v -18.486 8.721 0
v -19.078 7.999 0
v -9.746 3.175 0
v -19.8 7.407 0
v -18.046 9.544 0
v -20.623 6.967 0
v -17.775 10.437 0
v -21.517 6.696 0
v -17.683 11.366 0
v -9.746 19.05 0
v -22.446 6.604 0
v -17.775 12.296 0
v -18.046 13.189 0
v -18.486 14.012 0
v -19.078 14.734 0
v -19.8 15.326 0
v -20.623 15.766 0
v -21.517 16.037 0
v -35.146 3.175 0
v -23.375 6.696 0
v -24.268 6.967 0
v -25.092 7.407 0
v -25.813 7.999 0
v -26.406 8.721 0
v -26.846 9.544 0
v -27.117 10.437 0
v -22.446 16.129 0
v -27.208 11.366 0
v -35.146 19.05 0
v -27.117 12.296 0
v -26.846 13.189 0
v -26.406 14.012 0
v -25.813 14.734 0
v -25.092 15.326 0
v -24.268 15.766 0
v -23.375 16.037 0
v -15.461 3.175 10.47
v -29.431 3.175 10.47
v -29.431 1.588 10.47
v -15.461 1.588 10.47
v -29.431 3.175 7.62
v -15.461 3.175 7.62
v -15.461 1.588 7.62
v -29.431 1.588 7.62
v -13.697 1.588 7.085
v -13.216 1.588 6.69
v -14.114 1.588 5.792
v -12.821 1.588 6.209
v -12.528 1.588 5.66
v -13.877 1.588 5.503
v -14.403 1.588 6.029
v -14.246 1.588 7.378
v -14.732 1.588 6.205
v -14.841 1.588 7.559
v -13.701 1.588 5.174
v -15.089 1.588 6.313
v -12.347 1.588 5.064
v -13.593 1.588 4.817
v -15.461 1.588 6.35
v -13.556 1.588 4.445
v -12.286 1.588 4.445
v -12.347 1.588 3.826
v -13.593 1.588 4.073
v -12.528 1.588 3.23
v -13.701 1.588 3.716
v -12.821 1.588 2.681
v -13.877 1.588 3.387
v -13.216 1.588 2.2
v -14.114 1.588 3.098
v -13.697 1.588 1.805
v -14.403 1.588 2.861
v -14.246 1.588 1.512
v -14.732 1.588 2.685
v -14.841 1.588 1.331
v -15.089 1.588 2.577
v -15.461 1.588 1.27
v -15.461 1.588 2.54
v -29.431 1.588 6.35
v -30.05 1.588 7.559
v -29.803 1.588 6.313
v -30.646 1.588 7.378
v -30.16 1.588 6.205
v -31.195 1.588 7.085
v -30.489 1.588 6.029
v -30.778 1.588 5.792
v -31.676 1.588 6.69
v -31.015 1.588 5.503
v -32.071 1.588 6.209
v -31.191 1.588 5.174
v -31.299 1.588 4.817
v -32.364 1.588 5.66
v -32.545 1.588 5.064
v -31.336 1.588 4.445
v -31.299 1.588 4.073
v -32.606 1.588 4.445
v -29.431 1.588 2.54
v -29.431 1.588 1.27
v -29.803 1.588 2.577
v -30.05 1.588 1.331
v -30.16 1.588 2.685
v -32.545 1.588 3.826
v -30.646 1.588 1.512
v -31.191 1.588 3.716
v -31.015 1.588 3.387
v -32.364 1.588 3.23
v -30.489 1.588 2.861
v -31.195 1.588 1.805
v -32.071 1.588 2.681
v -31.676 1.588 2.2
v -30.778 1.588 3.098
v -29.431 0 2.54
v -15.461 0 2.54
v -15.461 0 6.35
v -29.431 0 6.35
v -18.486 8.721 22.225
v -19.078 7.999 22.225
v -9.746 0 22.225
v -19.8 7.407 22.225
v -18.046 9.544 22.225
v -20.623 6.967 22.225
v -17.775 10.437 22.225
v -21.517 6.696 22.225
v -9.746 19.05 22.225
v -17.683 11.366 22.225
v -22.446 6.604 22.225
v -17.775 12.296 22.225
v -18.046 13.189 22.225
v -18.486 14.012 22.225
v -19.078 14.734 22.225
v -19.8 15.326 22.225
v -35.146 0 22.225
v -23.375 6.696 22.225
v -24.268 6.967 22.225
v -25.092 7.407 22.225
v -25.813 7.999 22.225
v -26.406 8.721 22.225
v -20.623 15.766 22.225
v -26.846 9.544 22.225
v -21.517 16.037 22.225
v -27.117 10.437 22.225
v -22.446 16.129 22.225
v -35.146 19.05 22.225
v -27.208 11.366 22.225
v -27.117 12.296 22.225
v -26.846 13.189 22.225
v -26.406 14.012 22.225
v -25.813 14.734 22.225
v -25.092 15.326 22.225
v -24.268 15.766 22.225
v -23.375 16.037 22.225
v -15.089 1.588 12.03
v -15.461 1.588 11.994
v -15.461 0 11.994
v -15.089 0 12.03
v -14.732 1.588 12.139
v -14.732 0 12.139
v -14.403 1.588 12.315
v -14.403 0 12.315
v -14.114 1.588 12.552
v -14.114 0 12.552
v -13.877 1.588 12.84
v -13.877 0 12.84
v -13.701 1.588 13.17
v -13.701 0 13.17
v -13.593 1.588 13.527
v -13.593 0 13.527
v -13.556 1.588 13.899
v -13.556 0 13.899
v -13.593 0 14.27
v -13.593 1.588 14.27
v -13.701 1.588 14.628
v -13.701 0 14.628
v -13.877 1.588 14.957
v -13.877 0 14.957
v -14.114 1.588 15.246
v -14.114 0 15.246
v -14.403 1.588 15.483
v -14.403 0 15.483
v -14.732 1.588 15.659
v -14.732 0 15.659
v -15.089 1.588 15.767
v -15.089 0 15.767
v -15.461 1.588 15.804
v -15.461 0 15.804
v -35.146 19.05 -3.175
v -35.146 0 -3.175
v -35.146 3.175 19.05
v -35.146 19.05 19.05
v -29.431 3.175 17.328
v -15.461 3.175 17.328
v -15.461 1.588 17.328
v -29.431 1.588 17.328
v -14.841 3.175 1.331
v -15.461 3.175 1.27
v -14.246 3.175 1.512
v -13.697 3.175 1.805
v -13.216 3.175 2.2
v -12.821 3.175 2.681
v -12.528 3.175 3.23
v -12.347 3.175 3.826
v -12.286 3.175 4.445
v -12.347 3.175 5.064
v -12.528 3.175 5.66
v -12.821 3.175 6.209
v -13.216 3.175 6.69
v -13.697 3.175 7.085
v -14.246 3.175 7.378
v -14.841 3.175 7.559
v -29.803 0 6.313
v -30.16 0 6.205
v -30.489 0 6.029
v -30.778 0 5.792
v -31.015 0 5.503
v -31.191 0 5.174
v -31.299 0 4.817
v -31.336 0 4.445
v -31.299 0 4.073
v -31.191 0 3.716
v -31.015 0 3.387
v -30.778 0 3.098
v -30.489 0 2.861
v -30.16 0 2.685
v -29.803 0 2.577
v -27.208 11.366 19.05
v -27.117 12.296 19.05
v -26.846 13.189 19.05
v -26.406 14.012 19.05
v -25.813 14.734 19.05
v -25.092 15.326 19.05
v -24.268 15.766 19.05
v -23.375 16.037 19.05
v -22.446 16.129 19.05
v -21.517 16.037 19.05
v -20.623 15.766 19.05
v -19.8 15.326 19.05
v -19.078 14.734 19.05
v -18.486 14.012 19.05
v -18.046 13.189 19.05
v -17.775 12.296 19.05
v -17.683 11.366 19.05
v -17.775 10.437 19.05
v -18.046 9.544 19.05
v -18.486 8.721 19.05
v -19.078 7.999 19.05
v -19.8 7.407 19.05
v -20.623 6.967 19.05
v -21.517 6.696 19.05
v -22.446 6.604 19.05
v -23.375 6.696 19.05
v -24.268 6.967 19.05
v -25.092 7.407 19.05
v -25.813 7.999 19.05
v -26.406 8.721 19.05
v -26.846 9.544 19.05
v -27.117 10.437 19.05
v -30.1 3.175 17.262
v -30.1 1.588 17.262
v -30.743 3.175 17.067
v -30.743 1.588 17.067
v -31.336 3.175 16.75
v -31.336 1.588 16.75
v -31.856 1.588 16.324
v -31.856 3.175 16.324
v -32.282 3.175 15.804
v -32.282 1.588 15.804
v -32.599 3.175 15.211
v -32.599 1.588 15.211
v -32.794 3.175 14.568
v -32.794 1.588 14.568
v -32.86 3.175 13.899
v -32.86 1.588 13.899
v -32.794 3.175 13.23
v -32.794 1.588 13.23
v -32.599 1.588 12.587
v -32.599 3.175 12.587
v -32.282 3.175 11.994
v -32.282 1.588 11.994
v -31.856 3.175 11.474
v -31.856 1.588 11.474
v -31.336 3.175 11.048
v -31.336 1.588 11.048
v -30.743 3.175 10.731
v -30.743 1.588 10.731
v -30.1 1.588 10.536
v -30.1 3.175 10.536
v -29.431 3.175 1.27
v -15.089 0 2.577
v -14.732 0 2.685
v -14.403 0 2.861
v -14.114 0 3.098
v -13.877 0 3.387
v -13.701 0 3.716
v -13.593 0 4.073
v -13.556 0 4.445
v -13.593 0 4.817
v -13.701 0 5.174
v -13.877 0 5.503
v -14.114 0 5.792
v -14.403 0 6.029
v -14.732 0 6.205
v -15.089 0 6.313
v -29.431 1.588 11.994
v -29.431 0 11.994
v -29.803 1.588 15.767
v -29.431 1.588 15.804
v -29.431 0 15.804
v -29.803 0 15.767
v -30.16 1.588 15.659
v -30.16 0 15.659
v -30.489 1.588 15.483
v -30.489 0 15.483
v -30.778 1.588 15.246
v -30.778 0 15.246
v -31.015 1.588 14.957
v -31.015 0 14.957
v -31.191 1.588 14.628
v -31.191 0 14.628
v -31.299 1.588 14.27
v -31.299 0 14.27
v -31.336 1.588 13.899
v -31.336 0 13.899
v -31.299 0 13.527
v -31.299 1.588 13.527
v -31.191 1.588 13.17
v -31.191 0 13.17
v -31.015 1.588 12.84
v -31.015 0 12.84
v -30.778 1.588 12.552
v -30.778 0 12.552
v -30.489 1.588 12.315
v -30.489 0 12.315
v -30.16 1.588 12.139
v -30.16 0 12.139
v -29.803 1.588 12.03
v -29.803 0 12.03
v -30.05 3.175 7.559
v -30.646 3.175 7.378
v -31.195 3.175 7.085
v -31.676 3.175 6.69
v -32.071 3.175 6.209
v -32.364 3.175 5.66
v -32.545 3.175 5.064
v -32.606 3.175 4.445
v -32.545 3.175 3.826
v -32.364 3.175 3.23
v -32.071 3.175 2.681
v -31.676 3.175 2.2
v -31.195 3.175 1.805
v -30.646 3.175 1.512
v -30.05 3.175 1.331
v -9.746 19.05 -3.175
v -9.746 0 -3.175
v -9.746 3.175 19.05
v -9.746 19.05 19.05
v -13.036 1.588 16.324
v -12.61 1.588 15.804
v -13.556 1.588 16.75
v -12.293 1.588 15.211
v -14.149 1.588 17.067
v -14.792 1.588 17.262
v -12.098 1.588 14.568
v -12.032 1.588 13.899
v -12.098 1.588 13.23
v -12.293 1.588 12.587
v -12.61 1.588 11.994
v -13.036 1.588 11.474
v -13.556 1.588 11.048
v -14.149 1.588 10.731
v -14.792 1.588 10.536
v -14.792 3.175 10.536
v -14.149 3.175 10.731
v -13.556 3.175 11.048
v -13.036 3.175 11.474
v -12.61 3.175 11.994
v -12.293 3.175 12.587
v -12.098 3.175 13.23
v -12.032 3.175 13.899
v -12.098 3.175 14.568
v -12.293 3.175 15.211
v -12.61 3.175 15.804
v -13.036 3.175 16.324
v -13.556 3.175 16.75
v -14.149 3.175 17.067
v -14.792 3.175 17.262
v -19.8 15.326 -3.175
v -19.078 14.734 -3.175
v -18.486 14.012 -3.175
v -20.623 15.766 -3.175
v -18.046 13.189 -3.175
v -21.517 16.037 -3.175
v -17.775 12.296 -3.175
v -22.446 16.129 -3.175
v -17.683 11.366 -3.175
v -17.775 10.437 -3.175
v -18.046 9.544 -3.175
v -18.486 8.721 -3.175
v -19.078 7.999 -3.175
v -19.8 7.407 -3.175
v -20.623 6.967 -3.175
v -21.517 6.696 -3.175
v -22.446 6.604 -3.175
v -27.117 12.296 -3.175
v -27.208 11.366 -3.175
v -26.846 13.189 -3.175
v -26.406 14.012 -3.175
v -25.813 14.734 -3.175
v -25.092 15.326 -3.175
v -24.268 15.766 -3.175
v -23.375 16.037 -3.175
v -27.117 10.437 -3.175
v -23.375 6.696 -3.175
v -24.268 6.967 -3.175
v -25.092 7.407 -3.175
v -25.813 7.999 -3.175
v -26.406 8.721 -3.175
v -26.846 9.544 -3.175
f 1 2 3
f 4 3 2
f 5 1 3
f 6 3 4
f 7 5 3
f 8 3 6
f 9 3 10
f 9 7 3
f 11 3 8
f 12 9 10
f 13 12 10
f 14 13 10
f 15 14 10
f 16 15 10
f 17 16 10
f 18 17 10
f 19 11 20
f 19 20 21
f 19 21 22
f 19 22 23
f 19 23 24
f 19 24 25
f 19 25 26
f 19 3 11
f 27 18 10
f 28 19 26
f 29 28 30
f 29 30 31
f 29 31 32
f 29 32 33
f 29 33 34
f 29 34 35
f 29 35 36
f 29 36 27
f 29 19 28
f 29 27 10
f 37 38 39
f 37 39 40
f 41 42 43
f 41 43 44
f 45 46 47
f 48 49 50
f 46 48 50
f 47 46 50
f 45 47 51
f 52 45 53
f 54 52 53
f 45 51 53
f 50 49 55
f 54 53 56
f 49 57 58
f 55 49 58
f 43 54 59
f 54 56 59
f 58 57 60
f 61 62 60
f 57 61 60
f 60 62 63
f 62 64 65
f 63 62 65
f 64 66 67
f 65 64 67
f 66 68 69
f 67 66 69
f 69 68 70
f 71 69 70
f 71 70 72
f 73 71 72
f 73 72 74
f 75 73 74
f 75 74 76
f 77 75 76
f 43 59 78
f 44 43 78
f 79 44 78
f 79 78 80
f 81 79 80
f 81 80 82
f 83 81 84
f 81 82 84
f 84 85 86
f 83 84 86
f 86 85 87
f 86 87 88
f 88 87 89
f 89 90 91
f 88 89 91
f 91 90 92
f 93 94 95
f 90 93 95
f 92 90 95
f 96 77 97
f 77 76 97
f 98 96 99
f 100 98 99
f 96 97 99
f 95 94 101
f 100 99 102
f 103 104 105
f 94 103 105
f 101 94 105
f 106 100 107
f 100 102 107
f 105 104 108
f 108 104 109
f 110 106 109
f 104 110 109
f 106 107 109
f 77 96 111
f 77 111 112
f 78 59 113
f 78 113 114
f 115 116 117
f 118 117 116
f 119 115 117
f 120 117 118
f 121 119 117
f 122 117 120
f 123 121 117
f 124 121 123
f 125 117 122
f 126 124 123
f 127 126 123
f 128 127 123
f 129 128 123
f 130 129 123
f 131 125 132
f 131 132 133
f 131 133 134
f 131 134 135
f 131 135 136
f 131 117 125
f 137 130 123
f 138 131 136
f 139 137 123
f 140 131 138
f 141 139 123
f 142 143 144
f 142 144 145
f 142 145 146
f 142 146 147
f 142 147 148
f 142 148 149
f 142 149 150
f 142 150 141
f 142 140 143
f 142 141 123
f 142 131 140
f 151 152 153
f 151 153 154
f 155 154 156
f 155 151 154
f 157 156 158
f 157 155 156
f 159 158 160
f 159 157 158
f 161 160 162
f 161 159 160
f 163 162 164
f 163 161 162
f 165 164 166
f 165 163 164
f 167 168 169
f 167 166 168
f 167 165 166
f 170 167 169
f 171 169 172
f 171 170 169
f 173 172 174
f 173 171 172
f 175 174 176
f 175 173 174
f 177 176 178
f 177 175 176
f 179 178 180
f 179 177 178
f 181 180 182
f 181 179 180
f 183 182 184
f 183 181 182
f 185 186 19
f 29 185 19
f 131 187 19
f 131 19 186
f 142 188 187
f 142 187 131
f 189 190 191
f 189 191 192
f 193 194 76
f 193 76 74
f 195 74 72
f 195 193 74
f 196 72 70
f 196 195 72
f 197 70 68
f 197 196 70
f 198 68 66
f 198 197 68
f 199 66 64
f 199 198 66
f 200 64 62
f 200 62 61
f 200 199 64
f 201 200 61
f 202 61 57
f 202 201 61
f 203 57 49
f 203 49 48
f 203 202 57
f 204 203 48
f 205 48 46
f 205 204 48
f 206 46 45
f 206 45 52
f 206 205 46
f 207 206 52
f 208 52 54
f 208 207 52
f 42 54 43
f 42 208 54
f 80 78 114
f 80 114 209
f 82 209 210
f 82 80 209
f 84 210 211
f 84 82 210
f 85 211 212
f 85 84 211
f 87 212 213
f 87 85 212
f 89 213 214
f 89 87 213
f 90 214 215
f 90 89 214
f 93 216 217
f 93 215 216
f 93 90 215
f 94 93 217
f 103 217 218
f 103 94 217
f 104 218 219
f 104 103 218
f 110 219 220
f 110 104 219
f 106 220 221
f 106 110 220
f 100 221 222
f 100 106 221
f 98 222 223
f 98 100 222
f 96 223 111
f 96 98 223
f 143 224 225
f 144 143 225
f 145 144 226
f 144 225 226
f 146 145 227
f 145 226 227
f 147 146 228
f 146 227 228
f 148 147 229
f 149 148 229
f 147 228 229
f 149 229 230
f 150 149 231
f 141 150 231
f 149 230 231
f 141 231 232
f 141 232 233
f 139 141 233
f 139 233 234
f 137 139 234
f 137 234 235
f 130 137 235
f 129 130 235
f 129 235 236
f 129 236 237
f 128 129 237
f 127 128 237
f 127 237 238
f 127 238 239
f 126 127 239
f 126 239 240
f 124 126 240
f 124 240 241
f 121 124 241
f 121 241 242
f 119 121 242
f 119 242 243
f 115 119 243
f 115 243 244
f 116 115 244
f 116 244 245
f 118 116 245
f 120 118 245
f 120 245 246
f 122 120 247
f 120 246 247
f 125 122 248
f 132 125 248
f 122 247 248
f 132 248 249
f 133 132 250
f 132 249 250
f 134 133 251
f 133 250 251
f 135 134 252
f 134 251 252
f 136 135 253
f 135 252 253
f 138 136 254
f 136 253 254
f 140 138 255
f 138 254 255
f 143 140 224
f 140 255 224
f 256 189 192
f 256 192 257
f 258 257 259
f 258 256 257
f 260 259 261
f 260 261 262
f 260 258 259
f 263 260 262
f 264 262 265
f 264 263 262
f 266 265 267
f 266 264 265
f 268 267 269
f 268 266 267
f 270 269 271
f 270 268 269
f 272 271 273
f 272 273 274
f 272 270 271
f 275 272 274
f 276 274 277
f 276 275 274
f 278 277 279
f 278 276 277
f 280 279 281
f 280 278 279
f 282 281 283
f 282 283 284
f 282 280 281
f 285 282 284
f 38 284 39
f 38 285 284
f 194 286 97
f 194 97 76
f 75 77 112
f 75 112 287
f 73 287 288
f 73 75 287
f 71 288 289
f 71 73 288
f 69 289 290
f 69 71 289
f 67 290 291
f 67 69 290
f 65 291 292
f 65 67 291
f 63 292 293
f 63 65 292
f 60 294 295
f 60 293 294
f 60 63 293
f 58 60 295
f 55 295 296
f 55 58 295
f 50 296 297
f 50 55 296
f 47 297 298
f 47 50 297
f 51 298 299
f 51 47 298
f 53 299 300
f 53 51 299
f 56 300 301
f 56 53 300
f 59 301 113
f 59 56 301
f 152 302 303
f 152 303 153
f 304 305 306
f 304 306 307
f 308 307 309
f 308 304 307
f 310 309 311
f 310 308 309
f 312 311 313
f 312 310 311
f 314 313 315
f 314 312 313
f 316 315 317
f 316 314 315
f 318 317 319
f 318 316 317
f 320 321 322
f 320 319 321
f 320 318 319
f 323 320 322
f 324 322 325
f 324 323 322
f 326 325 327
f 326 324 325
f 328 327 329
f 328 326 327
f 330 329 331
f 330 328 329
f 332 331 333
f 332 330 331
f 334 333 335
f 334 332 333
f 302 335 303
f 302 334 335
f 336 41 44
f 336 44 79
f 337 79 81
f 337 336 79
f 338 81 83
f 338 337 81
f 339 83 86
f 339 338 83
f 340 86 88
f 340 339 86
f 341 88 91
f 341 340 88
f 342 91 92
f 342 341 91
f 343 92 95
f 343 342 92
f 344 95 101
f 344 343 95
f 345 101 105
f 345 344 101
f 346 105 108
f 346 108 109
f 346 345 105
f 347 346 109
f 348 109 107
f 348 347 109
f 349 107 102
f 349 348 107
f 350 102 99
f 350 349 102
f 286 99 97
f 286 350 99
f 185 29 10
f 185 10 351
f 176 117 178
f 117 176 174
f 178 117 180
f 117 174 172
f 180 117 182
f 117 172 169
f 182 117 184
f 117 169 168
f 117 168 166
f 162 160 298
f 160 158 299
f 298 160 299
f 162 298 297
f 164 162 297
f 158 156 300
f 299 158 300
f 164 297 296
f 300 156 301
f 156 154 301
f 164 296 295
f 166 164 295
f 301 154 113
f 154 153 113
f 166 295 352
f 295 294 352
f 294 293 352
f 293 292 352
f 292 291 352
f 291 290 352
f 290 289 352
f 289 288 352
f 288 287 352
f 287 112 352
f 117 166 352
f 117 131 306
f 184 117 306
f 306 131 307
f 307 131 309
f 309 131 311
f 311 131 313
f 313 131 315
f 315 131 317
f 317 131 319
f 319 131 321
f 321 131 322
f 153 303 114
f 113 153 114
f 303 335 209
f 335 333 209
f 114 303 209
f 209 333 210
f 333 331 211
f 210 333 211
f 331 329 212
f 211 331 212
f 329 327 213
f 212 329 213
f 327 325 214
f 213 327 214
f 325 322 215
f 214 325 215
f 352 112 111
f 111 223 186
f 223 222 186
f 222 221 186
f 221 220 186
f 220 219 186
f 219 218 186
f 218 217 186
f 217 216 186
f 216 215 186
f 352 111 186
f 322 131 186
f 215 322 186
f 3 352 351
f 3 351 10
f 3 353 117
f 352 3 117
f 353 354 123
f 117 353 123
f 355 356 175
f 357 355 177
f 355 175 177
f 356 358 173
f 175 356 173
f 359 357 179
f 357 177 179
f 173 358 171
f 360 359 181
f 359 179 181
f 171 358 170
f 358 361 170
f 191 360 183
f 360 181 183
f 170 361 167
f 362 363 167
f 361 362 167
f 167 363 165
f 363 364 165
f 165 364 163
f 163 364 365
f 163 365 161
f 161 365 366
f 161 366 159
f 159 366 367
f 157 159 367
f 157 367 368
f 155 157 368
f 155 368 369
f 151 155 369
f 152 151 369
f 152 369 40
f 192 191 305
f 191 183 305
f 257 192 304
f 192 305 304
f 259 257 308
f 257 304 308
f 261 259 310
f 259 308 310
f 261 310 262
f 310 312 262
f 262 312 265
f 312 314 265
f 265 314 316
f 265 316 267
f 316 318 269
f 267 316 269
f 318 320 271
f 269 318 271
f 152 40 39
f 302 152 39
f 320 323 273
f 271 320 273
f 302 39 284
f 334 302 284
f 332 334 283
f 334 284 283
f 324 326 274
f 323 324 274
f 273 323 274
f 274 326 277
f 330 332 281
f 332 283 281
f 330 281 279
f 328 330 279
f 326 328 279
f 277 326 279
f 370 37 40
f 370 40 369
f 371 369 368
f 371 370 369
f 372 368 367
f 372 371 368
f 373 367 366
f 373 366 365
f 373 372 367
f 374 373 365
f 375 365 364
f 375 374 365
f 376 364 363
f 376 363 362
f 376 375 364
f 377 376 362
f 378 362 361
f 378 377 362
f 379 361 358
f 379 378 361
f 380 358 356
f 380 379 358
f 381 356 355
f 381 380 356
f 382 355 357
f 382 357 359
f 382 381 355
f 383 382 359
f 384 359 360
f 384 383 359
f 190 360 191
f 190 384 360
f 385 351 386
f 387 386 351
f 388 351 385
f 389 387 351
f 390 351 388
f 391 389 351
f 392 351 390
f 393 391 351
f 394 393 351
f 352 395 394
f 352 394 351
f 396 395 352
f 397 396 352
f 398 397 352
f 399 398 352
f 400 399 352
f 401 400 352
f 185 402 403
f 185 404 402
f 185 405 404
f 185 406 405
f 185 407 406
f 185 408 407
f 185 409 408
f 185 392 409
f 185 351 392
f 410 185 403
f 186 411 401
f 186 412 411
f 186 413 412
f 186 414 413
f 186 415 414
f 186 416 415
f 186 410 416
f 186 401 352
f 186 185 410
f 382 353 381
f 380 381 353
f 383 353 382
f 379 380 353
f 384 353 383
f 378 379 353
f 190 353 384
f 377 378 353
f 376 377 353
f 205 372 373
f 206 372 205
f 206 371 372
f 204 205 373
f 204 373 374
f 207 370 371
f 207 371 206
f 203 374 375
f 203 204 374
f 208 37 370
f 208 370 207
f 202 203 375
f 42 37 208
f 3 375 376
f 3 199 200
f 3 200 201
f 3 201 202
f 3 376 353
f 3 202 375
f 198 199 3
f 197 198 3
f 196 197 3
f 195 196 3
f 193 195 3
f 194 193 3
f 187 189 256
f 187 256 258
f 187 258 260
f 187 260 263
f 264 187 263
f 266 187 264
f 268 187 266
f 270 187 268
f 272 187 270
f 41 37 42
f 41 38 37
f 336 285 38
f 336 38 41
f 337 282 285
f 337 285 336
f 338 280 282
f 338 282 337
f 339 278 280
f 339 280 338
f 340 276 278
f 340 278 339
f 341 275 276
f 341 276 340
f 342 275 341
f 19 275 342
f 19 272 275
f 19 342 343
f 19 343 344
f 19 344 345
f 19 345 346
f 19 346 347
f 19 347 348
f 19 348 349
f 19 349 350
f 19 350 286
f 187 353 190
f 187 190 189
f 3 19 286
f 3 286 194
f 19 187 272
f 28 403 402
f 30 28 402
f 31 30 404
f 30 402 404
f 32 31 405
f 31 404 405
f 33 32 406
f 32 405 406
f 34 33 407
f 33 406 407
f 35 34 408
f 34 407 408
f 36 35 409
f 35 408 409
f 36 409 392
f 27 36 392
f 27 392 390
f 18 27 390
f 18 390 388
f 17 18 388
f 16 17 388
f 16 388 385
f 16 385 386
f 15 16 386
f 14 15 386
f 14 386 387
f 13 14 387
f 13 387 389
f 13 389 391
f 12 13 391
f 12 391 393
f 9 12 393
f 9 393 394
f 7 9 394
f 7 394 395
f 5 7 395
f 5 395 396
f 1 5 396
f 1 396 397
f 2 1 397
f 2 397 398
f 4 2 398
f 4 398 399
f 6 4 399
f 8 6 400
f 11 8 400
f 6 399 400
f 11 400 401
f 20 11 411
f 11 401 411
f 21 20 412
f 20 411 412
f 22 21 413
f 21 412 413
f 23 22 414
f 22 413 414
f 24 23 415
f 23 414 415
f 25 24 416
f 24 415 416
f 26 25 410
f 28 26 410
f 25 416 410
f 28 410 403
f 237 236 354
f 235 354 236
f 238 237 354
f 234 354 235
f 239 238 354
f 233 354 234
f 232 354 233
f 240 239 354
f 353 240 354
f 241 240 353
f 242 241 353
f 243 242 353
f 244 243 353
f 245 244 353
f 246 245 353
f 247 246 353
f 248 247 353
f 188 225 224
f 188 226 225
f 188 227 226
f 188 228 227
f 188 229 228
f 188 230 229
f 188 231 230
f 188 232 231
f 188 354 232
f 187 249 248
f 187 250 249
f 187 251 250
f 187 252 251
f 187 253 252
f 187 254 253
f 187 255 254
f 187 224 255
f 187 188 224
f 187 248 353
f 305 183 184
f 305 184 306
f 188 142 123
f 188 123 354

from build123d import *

# Parameters (mm, degrees)
BOSS_EXTRUDE2_DEPTH = 25.4
SKETCH3_R           = 4.7625
CUT_EXTRUDE1_DEPTH  = 36.576
CUT_EXTRUDE2_DEPTH  = 66.04
CUT_EXTRUDE3_DEPTH  = 1.5875
CUT_EXTRUDE4_DEPTH  = 1.5875
CUT_EXTRUDE5_DEPTH  = 45.510676996


with BuildPart() as part:
    # Sketch1 → Boss-Extrude2 (new body)
    with BuildSketch(Plane(origin=(-35.145897579, 0, 0), x_dir=(0, 0, -1), z_dir=(1, 0, 0))):
        Polygon((0, 0), (-19.05, 0), (-22.225, 0), (-22.225, 19.05), (-19.05, 19.05), (-19.05, 3.175), (0, 3.175), (0, 19.05), (3.175, 19.05), (3.175, 0), align=None)
    extrude(amount=BOSS_EXTRUDE2_DEPTH)

    # Sketch3 → Cut-Extrude1 (cut)
    with BuildSketch(Plane(origin=(0, 0, -3.175), x_dir=(-1, 0, 0), z_dir=(0, 0, -1))):
        with Locations((22.445897579, 11.3665)):
            Circle(SKETCH3_R)
    extrude(amount=-CUT_EXTRUDE1_DEPTH, mode=Mode.SUBTRACT)

    # Sketch4 → Cut-Extrude2 (cut)
    with BuildSketch(Plane(origin=(0, 3.175, 0), x_dir=(1, 0, 0), z_dir=(0, 1, 0))):
        with BuildLine():
            Line((-29.430897579, -2.54), (-15.460897579, -2.54))
            ThreePointArc((-15.460897579, -2.54), (-13.555897579, -4.445), (-15.460897579, -6.35))
            Line((-15.460897579, -6.35), (-29.430897579, -6.35))
            ThreePointArc((-29.430897579, -6.35), (-31.335897579, -4.445), (-29.430897579, -2.54))
        make_face()
    extrude(amount=-CUT_EXTRUDE2_DEPTH, mode=Mode.SUBTRACT)

    # Sketch7 → Cut-Extrude3 (cut)
    with BuildSketch(Plane(origin=(0, 3.175, 0), x_dir=(1, 0, 0), z_dir=(0, 1, 0))):
        with BuildLine():
            Line((-29.430897579, -1.27), (-15.460897579, -1.27))
            ThreePointArc((-15.460897579, -1.27), (-12.285897579, -4.445), (-15.460897579, -7.62))
            Line((-15.460897579, -7.62), (-29.430897579, -7.62))
            ThreePointArc((-29.430897579, -7.62), (-32.605897579, -4.445), (-29.430897579, -1.27))
        make_face()
    extrude(amount=-CUT_EXTRUDE3_DEPTH, mode=Mode.SUBTRACT)

    # Sketch8 → Cut-Extrude4 (cut)
    with BuildSketch(Plane(origin=(0, 3.175, 0), x_dir=(1, 0, 0), z_dir=(0, 1, 0))):
        with BuildLine():
            Line((-15.460897579, -10.469840803), (-29.430897579, -10.469840803))
            ThreePointArc((-29.430897579, -10.469840803), (-32.859897579, -13.898840803), (-29.430897579, -17.327840803))
            Line((-29.430897579, -17.327840803), (-15.460897579, -17.327840803))
            ThreePointArc((-15.460897579, -17.327840803), (-12.031897579, -13.898840803), (-15.460897579, -10.469840803))
        make_face()
    extrude(amount=-CUT_EXTRUDE4_DEPTH, mode=Mode.SUBTRACT)

    # Sketch8<3> → Cut-Extrude5 (cut, through all)
    with BuildSketch(Plane(origin=(0, 3.175, 0), x_dir=(1, 0, 0), z_dir=(0, 1, 0))):
        with BuildLine():
            Line((-15.460897579, -11.993840803), (-29.430897579, -11.993840803))
            ThreePointArc((-29.430897579, -11.993840803), (-31.335897579, -13.898840803), (-29.430897579, -15.803840803))
            Line((-29.430897579, -15.803840803), (-15.460897579, -15.803840803))
            ThreePointArc((-15.460897579, -15.803840803), (-13.555897579, -13.898840803), (-15.460897579, -11.993840803))
        make_face()
    extrude(amount=-CUT_EXTRUDE5_DEPTH, mode=Mode.SUBTRACT)


solid = part.part
